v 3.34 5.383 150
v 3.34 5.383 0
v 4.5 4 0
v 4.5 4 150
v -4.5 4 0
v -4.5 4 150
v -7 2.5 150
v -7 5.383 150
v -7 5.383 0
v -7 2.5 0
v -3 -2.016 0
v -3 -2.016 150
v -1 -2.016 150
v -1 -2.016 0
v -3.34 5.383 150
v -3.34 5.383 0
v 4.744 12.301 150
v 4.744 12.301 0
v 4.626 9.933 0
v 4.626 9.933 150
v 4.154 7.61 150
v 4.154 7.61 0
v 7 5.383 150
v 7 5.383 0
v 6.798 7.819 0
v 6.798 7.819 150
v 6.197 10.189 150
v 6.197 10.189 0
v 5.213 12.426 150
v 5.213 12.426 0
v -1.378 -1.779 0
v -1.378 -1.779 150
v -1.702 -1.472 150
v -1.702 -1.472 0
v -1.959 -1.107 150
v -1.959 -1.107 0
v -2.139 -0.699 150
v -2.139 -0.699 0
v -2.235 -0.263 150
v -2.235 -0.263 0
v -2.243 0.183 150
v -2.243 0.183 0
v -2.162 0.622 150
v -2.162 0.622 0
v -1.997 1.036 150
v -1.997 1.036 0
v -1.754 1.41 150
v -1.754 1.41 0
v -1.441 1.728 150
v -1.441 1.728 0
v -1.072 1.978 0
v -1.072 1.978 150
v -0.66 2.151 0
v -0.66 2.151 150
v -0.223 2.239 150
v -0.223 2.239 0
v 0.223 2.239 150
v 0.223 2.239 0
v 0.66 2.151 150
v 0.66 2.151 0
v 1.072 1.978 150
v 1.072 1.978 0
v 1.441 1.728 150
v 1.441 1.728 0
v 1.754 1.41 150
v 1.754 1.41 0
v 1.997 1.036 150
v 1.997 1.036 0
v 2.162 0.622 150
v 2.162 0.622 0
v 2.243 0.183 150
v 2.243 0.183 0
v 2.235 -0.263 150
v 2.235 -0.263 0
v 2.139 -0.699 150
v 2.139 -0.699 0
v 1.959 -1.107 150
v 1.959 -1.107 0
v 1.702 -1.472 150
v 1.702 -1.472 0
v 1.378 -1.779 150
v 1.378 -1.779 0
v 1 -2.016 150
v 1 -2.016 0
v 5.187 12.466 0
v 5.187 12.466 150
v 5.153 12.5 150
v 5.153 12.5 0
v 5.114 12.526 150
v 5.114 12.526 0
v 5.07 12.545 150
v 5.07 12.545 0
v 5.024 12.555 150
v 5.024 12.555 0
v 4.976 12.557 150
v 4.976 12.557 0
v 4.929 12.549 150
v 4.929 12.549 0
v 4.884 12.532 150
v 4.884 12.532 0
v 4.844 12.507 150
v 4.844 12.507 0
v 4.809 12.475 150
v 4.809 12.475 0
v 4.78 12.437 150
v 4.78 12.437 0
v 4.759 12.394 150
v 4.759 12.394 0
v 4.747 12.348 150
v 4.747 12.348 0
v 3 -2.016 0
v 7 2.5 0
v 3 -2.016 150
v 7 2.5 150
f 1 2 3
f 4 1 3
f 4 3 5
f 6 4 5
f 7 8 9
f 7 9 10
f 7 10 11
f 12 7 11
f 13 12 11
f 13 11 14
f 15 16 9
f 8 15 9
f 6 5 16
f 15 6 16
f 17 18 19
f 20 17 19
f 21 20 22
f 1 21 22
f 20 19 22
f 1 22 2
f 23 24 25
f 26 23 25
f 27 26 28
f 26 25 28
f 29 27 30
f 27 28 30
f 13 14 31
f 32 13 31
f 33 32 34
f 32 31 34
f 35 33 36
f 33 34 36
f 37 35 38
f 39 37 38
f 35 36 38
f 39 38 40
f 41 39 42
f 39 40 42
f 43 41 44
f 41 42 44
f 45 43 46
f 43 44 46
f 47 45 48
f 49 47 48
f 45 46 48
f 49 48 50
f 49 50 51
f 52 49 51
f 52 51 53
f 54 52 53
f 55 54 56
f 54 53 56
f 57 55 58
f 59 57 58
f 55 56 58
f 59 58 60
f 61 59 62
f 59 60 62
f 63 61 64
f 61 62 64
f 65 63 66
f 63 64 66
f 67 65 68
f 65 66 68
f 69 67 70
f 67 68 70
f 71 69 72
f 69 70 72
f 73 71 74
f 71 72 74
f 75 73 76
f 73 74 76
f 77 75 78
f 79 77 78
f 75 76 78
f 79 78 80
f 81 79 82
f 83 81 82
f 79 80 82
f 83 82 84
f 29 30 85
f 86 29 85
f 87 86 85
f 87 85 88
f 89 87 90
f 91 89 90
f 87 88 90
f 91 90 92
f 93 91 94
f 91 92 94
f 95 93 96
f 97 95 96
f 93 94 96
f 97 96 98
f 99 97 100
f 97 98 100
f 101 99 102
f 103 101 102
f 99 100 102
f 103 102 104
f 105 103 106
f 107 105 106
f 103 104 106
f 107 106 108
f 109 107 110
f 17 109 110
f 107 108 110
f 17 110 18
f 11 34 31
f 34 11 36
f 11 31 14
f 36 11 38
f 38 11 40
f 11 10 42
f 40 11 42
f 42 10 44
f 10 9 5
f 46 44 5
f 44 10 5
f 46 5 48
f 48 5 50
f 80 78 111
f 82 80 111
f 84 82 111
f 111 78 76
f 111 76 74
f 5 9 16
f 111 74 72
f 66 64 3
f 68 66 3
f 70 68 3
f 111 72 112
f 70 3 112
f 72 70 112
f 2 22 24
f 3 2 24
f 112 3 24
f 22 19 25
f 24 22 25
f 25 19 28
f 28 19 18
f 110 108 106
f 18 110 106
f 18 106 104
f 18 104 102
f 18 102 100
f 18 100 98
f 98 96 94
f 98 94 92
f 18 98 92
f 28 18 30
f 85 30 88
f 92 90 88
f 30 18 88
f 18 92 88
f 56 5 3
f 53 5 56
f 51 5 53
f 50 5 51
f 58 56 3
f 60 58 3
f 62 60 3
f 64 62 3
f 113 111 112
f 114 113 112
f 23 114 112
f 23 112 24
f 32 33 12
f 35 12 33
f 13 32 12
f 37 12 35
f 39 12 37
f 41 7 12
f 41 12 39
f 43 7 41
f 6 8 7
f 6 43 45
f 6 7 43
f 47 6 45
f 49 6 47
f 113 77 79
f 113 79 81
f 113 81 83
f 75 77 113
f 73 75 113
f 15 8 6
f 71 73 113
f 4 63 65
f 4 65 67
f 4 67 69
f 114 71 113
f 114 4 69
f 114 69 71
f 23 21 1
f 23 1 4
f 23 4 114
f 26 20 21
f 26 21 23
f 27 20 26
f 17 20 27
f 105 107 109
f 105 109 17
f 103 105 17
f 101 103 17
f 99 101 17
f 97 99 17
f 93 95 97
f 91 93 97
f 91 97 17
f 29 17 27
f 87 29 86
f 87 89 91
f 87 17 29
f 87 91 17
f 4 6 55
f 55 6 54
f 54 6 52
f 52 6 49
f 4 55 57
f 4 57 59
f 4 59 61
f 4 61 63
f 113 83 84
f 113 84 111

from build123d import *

# Parameters (mm, degrees)
F1_DEPTH = 150


with BuildPart() as f1:
    # F0 (on Top) → F1 (new body)
    with BuildSketch(Plane.XY):
        Polygon((7, 2.5), (7, 4), (4.5, 4), (-4.5, 4), (-7, 4), (-7, 2.5), align=None)
        Polygon((4.5, 4), (7, 4), (7, 5.382979), (3.339543, 5.382979), align=None)
        with BuildLine():
            Line((3, -2.015564), (7, 2.5))
            Line((7, 2.5), (-7, 2.5))
            Line((-7, 2.5), (-3, -2.015564))
            Line((-3, -2.015564), (-1, -2.015564))
            ThreePointArc((-1, -2.015564), (0, 2.25), (1, -2.015564))
            Line((1, -2.015564), (3, -2.015564))
        make_face()
        with BuildLine():
            Line((3.339543, 5.382979), (7, 5.382979))
            ThreePointArc((7, 5.382979), (6.546372, 9.016241), (5.21334, 12.426431))
            ThreePointArc((5.21334, 12.426431), (4.929027, 12.548792), (4.743648, 12.300918))
            ThreePointArc((4.743648, 12.300918), (4.433508, 8.762404), (3.339543, 5.382979))
        make_face()
        Polygon((-7, 4), (-4.5, 4), (-3.339543, 5.382979), (-7, 5.382979), align=None)
    extrude(amount=F1_DEPTH)


solid = f1.part
